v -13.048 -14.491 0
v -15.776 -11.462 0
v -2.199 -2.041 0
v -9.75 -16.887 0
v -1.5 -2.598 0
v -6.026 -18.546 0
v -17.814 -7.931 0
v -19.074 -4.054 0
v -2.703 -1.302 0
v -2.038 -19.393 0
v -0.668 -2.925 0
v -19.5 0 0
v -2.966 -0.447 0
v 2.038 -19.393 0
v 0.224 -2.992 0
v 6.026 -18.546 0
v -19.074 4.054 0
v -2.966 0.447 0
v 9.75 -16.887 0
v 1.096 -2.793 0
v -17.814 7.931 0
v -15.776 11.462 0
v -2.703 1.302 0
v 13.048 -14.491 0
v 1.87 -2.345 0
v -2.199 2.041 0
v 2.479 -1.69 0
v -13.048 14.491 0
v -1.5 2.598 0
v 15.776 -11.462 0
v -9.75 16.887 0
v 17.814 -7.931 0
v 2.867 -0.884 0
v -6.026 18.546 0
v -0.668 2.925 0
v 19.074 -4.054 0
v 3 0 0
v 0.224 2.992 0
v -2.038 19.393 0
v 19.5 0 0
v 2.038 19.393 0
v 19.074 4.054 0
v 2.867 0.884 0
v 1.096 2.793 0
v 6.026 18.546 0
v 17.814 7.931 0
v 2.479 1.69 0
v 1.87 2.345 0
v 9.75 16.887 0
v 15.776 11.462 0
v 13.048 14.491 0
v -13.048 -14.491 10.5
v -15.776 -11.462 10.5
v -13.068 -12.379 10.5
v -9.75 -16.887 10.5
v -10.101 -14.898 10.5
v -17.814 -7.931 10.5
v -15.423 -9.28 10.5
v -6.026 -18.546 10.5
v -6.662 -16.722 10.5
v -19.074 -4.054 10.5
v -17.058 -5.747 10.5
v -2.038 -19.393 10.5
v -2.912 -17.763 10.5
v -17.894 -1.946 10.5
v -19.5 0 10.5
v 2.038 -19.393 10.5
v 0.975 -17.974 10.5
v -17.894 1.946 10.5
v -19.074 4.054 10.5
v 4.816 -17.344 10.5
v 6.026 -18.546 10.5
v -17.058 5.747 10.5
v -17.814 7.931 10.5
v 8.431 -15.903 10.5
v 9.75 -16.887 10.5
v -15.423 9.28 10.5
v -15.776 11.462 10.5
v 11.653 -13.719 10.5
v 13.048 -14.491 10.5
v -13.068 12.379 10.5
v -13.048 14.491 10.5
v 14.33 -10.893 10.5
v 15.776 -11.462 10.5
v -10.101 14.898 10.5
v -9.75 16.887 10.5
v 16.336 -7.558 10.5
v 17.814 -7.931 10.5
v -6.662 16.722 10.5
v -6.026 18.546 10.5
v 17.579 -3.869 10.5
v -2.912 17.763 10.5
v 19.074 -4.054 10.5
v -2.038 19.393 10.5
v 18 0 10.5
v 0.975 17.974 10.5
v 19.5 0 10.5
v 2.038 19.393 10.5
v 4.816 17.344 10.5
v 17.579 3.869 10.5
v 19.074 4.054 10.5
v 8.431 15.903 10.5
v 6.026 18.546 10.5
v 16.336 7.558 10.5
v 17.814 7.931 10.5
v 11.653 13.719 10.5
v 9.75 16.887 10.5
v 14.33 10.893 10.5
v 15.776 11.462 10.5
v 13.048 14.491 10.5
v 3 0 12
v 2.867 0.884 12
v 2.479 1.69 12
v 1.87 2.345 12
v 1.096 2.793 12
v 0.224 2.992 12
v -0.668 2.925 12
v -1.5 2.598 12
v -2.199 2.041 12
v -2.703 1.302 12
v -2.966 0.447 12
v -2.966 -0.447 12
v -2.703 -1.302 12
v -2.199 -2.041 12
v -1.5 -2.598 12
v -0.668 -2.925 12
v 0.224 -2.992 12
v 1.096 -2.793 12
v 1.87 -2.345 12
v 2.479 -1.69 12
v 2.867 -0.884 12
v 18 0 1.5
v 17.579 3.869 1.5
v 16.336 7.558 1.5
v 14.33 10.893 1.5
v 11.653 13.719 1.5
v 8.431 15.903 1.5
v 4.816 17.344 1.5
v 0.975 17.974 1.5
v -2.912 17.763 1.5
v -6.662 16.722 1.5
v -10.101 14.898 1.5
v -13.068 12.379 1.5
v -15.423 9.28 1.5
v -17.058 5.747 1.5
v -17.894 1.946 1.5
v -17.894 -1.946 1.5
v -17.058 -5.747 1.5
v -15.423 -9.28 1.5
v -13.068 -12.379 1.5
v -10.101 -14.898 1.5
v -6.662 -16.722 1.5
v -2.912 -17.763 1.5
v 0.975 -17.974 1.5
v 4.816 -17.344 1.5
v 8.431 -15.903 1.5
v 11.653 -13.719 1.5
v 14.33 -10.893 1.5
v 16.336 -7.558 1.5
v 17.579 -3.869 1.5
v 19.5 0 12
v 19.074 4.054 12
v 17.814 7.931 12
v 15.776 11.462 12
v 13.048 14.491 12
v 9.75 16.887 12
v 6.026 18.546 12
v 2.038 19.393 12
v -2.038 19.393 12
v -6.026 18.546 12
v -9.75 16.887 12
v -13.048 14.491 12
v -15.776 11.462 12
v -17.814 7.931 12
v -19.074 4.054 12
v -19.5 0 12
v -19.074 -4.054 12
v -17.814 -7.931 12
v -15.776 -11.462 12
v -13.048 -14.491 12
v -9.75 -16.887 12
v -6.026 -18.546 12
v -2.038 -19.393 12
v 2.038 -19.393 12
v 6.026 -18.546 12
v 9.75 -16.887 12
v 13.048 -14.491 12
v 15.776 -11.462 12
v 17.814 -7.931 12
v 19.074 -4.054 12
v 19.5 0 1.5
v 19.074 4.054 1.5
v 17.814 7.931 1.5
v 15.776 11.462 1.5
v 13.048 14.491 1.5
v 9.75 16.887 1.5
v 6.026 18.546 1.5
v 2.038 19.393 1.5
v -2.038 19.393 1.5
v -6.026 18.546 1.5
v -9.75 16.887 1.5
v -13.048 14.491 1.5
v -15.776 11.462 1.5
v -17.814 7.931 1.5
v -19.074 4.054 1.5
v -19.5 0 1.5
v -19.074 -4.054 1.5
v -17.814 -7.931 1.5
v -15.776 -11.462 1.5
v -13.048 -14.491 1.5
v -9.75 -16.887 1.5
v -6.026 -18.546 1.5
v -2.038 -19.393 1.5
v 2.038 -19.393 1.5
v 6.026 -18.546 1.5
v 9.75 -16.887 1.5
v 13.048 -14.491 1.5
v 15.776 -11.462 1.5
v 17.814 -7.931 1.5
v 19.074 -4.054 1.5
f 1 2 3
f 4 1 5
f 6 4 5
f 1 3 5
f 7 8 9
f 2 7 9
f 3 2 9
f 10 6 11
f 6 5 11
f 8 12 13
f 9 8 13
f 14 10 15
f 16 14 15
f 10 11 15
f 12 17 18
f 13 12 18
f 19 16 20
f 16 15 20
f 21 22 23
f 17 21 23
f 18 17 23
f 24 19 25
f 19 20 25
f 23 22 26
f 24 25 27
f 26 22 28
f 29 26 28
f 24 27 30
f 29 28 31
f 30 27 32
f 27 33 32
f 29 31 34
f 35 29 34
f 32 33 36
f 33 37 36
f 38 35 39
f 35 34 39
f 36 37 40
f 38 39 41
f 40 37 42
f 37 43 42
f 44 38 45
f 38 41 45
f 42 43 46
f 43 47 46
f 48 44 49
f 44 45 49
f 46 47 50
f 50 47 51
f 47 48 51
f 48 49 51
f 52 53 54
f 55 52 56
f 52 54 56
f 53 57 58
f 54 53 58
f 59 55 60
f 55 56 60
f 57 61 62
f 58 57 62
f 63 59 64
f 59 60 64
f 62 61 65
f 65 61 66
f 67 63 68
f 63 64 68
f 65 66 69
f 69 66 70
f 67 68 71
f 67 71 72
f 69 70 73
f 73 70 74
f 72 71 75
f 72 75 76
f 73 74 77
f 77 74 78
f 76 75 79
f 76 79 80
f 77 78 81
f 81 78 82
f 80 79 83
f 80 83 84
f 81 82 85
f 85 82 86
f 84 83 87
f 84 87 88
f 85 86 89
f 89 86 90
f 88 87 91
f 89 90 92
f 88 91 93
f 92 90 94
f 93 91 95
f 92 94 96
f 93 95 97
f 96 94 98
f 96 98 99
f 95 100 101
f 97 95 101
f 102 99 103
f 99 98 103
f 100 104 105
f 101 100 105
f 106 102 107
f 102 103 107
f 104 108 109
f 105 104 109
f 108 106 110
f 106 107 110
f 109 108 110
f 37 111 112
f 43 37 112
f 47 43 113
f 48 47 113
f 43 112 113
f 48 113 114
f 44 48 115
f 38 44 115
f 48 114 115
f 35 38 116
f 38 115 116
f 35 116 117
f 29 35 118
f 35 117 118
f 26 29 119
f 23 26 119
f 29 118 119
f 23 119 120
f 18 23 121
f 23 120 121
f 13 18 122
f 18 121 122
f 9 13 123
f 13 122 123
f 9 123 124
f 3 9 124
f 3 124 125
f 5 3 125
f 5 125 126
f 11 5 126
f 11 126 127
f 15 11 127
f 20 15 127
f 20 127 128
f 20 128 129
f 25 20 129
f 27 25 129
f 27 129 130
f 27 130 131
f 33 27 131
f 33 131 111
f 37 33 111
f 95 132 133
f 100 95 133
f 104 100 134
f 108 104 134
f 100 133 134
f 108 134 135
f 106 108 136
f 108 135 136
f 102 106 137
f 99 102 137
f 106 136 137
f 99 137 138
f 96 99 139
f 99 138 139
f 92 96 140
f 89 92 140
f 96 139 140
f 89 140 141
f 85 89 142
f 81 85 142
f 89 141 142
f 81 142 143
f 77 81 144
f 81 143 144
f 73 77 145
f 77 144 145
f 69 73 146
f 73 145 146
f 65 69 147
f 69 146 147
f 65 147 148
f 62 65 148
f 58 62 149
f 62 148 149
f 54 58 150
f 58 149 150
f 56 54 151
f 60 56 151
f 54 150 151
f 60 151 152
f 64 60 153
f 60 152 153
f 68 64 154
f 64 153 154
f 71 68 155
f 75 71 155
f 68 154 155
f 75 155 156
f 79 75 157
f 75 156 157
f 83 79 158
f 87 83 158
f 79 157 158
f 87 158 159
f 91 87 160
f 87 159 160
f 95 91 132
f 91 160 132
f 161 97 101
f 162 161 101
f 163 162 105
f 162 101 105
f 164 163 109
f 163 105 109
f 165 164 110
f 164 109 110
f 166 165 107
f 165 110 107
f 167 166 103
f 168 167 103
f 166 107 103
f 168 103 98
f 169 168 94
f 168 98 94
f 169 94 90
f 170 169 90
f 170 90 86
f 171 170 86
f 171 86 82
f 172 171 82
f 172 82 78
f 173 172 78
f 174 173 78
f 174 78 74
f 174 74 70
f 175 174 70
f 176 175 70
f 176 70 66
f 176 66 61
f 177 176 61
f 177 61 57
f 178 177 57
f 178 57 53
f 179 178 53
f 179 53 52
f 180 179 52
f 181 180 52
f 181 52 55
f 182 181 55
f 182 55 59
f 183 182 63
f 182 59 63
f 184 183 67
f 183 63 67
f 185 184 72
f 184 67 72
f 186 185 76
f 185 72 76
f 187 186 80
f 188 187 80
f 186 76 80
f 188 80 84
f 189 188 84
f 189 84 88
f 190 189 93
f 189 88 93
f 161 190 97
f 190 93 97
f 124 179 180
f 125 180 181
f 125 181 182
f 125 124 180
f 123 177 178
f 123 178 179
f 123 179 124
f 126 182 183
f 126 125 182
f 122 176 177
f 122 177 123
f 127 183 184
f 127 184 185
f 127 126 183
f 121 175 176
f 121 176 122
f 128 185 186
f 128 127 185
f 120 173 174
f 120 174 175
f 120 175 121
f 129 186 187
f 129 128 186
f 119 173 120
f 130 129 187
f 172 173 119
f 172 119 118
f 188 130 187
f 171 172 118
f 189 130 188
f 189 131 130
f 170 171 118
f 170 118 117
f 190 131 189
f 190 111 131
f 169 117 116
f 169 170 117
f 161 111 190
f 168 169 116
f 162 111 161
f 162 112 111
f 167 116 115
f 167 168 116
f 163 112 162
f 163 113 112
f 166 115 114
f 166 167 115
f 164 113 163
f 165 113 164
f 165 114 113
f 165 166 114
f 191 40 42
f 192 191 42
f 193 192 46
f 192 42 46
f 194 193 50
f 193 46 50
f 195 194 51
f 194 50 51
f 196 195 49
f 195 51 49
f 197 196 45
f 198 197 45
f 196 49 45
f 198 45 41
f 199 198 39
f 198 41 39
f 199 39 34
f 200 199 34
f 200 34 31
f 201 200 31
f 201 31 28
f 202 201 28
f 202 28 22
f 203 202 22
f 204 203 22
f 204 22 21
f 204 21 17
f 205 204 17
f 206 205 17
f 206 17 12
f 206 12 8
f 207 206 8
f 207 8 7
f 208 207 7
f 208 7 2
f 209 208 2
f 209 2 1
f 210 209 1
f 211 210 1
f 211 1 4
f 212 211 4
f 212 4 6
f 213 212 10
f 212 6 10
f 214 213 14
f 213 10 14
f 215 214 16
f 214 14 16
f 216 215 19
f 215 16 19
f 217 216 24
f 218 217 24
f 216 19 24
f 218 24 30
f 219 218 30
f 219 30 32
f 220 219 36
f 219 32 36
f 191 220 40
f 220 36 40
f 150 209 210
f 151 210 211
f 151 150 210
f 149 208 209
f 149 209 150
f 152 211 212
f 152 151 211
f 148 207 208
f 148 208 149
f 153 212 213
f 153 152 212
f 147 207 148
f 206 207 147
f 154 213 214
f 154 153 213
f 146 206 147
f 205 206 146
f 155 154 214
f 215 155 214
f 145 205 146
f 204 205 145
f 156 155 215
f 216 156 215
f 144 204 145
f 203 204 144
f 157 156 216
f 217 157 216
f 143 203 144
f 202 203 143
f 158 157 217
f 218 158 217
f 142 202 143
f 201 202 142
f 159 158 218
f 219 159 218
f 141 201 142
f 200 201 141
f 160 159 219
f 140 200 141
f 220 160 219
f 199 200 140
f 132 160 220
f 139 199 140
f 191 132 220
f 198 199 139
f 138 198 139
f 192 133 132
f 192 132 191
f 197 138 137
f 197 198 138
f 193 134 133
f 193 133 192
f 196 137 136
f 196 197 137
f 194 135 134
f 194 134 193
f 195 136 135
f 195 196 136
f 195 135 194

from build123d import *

# Parameters (mm, degrees)
SKETCH_1_R               = 19.5
EXTRUDE_1_DEPTH          = 12
CUT_EXTRUDE_1_DEPTH      = 4.5
CUT_EXTRUDE_1_DEPTH_BACK = 4.5
SKETCH_2_R               = 19.5
SKETCH_2_R_2             = 18
SKETCH_3_R               = 3
CUT_EXTRUDE_2_DEPTH      = 31.074906484


with BuildPart() as part:
    # 草图1 → 凸台-拉伸1 (new body)
    with BuildSketch(Plane.XY):
        Circle(SKETCH_1_R)
    extrude(amount=EXTRUDE_1_DEPTH)

    # 草图2 → 切除-拉伸1 (cut, two sides: drawn at the far end of the back side and taken through both)
    with BuildSketch(Plane.XY.offset(6).offset(-CUT_EXTRUDE_1_DEPTH_BACK)):
        Circle(SKETCH_2_R)
        Circle(SKETCH_2_R_2, mode=Mode.SUBTRACT)
    extrude(amount=CUT_EXTRUDE_1_DEPTH + CUT_EXTRUDE_1_DEPTH_BACK, mode=Mode.SUBTRACT)

    # 草图3 → 切除-拉伸2 (cut, through all)
    with BuildSketch(Plane.XY.offset(12)):
        Circle(SKETCH_3_R)
    extrude(amount=-CUT_EXTRUDE_2_DEPTH, mode=Mode.SUBTRACT)


solid = part.part
